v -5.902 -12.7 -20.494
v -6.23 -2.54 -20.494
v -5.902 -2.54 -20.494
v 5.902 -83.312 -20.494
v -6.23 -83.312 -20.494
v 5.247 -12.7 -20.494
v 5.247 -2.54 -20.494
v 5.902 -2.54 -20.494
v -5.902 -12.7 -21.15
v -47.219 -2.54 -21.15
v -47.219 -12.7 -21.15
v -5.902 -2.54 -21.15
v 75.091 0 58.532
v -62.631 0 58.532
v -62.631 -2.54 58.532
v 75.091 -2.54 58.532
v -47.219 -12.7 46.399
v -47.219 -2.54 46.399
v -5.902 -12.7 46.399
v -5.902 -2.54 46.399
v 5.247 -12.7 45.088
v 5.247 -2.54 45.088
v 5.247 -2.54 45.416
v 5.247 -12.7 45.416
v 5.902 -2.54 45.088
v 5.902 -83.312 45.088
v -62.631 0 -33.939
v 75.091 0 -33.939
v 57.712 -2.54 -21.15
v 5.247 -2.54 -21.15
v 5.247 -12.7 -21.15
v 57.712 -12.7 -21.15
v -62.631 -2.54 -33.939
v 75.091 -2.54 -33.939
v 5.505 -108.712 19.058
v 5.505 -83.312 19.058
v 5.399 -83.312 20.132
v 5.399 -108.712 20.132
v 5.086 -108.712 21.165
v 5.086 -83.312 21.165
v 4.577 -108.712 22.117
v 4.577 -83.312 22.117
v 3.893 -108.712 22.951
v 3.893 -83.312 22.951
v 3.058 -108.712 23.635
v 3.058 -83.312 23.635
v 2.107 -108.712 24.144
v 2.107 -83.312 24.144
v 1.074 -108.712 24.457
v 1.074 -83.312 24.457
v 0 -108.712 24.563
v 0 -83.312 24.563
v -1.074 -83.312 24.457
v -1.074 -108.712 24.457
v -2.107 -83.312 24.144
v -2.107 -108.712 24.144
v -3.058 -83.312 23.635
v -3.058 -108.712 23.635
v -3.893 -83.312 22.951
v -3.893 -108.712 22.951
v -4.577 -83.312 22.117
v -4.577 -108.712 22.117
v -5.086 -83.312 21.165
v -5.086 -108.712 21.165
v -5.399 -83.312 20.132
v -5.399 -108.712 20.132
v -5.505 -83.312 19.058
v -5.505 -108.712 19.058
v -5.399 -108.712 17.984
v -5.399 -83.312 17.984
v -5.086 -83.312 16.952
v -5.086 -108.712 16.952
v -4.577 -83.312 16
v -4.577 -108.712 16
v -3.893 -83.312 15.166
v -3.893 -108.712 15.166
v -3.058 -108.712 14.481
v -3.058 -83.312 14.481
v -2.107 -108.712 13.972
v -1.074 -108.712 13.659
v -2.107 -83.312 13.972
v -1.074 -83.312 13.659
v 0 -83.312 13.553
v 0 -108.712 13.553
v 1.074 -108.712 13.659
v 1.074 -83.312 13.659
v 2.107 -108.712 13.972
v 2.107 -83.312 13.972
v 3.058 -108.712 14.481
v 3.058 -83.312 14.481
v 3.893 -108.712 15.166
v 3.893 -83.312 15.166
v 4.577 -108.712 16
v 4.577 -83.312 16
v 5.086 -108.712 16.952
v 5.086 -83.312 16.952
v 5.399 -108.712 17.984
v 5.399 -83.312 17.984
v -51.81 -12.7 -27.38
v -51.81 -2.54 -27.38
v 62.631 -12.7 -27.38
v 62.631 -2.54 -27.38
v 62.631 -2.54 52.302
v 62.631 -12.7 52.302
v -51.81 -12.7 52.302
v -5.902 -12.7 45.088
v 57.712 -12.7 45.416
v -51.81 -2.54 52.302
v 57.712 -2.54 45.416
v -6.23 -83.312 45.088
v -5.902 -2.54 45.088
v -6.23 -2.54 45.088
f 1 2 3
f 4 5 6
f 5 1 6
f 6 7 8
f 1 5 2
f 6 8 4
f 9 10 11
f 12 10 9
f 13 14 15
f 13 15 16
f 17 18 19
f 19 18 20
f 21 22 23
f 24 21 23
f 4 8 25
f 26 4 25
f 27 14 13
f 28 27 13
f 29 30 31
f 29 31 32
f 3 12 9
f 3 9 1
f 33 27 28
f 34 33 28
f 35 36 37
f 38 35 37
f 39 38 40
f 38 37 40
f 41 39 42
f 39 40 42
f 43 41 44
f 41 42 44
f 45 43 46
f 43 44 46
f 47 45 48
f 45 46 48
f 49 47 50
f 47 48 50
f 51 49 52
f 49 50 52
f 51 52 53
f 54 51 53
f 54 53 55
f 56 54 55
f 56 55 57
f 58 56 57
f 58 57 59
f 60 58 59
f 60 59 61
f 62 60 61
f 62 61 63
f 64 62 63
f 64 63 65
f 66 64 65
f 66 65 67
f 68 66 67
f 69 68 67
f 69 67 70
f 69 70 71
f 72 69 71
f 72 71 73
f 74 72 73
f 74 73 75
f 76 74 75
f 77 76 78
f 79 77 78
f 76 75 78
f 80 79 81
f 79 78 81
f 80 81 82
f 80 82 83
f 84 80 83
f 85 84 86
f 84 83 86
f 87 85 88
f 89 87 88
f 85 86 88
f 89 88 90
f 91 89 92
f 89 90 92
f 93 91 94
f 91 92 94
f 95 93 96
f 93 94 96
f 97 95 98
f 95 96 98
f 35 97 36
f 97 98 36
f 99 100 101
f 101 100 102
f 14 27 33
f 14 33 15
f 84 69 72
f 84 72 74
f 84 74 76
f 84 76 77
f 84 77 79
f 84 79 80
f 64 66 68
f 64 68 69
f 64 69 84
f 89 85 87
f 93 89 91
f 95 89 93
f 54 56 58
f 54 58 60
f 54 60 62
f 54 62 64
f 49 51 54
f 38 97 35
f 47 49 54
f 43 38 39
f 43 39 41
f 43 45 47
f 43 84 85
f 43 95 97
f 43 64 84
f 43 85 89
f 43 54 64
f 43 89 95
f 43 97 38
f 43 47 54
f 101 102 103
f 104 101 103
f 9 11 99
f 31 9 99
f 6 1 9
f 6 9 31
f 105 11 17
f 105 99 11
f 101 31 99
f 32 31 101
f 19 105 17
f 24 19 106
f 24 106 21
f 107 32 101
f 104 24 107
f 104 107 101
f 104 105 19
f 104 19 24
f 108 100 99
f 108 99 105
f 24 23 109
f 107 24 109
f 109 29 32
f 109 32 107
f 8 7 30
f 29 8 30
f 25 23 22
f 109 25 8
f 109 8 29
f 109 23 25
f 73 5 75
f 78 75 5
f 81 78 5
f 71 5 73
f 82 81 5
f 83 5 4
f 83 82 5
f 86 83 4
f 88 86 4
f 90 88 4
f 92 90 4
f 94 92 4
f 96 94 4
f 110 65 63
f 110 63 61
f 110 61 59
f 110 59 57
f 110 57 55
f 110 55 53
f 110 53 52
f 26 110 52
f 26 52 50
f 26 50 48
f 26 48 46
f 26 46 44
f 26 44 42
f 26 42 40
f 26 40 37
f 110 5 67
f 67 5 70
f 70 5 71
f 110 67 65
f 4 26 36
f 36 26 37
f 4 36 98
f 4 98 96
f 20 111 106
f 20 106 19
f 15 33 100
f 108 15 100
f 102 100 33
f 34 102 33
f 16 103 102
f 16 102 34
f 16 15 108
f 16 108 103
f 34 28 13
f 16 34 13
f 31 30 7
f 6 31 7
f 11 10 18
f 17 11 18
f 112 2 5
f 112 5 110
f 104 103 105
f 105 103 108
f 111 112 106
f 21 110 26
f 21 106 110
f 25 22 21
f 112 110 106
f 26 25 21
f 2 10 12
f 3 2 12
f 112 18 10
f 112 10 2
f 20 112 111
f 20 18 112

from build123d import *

# Parameters (mm, degrees)
F0_W     = 51.809754
F0_H     = 79.682095
F0_W_2   = 41.31664
F0_H_2   = 67.549428
F0_W_3   = 62.63078
F0_W_4   = 52.465571
F0_H_3   = 66.565698
F1_DEPTH = 12.7
F2_W     = 137.722135
F2_H     = 92.470575
F3_DEPTH = 2.54
F4_W     = 12.132665
F4_H     = 65.58197
F5_DEPTH = 83.312
F6_R     = 5.504968
F7_DEPTH = 108.712


with BuildPart() as f1:
    # F0 (on Front) → F1 (new body)
    with BuildSketch(Plane.XZ):
        with Locations((-25.904877, 12.460576)):
            Rectangle(F0_W, F0_H)
        with Locations((-26.560696, 12.624529)):
            Rectangle(F0_W_2, F0_H_2, mode=Mode.SUBTRACT)
        with Locations((31.31539, 12.460576)):
            Rectangle(F0_W_3, F0_H)
        with Locations((31.479344, 12.132664)):
            Rectangle(F0_W_4, F0_H_3, mode=Mode.SUBTRACT)
    extrude(amount=F1_DEPTH)

    # F2 (on Front) → F3 (join)
    with BuildSketch(Plane.XZ):
        with Locations((6.230287, 12.296619)):
            Rectangle(F2_W, F2_H)
    extrude(amount=F3_DEPTH)

    # F4 (on Front) → F5 (join)
    with BuildSketch(Plane.XZ):
        with Locations((-0.163952, 12.296621)):
            Rectangle(F4_W, F4_H)
    extrude(amount=F5_DEPTH)

    # F6 (on Front) → F7 (join)
    with BuildSketch(Plane.XZ):
        with Locations((0, 19.058177)):
            Circle(F6_R)
    extrude(amount=F7_DEPTH)


solid = f1.part
